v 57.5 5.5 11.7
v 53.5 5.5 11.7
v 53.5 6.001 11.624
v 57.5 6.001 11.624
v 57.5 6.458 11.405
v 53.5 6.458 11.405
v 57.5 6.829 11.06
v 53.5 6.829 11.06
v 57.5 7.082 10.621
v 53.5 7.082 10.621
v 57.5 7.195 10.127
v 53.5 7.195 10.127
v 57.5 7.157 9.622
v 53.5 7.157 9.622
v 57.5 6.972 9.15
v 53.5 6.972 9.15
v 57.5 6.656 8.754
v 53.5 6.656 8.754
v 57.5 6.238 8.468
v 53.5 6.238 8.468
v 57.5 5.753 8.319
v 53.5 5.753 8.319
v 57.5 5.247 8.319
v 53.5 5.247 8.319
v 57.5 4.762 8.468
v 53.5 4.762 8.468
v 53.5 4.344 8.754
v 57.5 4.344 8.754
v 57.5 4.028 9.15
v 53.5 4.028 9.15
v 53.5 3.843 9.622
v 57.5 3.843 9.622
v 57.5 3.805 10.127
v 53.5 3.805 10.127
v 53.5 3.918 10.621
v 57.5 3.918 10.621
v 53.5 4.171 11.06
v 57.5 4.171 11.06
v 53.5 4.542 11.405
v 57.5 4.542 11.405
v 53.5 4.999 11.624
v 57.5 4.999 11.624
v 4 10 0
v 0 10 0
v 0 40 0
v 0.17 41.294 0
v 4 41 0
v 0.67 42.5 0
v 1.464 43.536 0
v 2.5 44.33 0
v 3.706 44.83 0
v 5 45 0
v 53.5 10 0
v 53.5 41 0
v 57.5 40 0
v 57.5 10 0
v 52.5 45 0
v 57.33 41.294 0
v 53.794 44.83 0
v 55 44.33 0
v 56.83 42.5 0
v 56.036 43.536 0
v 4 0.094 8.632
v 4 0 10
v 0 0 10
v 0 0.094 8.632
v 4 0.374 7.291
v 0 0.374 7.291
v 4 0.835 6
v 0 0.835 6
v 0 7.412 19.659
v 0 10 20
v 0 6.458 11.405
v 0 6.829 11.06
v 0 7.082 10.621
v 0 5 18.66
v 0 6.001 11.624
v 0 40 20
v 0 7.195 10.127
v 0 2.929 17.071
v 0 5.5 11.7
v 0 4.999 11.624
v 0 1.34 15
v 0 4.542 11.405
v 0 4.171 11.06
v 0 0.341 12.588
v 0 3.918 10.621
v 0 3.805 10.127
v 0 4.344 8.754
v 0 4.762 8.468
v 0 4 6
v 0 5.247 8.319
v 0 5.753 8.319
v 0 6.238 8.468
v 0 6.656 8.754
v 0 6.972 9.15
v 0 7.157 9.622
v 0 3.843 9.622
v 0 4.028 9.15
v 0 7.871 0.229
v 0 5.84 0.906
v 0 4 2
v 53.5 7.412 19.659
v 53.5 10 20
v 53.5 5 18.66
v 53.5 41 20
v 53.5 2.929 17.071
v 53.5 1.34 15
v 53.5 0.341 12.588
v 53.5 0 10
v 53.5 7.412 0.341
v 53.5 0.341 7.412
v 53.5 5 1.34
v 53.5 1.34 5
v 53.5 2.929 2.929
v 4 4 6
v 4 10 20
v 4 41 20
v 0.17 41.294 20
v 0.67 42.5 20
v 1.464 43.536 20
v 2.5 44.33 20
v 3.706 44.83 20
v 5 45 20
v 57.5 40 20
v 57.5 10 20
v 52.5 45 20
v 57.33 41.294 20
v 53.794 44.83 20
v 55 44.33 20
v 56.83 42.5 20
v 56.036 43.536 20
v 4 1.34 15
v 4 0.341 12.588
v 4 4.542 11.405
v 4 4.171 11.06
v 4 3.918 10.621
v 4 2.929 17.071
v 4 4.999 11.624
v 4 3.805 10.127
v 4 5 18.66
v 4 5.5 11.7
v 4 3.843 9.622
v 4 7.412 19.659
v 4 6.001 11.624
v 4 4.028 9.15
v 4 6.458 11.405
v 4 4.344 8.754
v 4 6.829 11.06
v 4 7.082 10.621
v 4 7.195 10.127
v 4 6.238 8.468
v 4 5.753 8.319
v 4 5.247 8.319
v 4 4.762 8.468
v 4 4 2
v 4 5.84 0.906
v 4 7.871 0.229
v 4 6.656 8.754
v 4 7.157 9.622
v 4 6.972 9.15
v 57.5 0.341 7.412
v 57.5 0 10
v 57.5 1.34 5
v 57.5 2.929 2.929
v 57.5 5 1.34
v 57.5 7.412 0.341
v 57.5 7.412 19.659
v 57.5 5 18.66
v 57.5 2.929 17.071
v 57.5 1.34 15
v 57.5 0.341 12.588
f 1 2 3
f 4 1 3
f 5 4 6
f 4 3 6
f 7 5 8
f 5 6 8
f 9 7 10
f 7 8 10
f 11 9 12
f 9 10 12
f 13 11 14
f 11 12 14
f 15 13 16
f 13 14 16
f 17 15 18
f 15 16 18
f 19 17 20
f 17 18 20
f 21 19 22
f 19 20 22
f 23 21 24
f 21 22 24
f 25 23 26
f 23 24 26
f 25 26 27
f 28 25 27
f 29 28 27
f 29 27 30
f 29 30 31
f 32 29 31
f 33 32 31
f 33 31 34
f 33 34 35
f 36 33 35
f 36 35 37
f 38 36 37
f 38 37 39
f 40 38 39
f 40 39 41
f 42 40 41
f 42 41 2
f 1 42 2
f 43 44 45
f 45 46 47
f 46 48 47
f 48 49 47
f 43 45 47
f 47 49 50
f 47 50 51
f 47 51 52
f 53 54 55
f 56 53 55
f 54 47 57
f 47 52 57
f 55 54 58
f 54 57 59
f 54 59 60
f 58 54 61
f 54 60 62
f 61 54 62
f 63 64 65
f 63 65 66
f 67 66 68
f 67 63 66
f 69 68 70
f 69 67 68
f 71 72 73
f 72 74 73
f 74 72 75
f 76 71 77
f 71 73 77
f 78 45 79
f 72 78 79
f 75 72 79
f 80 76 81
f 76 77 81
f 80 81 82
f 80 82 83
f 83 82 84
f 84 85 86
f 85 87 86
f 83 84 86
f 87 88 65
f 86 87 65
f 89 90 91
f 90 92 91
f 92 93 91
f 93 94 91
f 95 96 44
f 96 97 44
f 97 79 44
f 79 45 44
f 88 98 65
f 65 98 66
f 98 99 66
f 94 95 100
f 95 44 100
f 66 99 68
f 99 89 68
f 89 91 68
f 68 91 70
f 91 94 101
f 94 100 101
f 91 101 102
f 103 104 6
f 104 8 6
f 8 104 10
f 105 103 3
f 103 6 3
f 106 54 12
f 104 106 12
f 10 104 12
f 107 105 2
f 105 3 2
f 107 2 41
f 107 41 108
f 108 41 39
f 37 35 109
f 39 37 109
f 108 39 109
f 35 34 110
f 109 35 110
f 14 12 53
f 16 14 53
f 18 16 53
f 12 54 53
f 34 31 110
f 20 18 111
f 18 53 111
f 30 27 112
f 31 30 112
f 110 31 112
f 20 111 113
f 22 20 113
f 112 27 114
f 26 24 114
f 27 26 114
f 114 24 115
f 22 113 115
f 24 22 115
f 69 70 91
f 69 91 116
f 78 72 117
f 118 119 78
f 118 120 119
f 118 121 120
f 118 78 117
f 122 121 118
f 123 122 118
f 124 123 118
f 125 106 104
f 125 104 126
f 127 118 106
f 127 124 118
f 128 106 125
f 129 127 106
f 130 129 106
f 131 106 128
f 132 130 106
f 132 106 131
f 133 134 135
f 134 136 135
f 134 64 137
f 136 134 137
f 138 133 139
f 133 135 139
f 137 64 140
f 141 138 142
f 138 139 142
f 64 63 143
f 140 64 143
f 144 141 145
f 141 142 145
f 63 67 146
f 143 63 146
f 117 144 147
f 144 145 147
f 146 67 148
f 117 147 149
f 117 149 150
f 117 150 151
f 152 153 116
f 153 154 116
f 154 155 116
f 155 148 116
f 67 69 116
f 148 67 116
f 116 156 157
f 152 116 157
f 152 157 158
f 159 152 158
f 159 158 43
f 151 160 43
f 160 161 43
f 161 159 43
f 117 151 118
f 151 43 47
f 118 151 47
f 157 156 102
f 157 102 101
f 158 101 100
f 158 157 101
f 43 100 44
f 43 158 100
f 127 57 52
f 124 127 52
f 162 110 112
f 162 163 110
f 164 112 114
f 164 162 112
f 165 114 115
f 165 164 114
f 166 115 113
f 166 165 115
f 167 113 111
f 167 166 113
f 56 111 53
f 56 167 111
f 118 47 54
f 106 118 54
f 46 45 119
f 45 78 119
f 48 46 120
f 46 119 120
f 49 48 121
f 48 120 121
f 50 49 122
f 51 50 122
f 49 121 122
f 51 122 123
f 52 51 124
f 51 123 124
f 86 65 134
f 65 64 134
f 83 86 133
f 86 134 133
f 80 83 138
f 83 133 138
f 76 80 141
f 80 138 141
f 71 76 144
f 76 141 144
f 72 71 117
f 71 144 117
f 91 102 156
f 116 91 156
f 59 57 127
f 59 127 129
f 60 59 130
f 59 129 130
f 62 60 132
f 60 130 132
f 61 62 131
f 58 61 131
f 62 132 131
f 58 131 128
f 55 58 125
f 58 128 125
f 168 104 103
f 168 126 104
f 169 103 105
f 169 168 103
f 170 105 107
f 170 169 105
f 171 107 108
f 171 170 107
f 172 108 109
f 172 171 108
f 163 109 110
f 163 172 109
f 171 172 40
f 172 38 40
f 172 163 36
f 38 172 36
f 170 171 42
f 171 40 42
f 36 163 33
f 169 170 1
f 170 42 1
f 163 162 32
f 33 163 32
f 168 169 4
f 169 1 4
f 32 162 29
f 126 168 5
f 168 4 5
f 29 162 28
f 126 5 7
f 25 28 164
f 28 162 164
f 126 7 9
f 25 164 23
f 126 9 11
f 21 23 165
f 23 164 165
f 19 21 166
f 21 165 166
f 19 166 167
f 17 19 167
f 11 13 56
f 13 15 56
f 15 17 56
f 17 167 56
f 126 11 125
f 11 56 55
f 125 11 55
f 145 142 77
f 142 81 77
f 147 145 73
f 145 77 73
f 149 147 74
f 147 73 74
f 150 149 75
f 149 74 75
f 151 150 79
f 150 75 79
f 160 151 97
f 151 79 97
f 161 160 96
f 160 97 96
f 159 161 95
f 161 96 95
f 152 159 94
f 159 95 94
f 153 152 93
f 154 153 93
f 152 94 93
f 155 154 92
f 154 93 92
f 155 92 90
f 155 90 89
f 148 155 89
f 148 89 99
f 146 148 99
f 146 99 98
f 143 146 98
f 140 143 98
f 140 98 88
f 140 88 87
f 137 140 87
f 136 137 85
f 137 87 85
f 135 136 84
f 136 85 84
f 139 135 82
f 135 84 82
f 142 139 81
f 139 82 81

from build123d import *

# Parameters (mm, degrees)
BOSS_EXTRU_1_DEPTH          = 20
ENL_V_MAT_EXTRU_1_REACH     = 77.705
ESQUISSE2_R                 = 1.5
D_GAGEMENT_M31_D            = 3.4
D_GAGEMENT_M31_DEPTH        = 57.5
D_GAGEMENT_M31_TIP          = 1.021463052
CONG_1_R                    = 10
CONG_2_R                    = 5
ENL_V_START                 = 0.83484861
ENL_V_MAT_EXTRU_2_OUTLINE_W = 4
ENL_V_MAT_EXTRU_2_OUTLINE_H = 5
ENL_V_MAT_EXTRU_2_DEPTH     = 3.16515139


# Read off the part's stored shape, not the designer's step: Enlèv. mat.-Extru.2
with BuildPart() as part:
    # Esquisse1 → Boss.-Extru.1 (new body)
    with BuildSketch(Plane.XY):
        Polygon((0, 0), (4, 0), (4, 41), (53.5, 41), (53.5, 0), (57.5, 0), (57.5, 45), (0, 45), align=None)
    extrude(amount=BOSS_EXTRU_1_DEPTH)

    # Enlèv. mat.-Extru.1: up to this face of the body (flat: up to its plane)
    enl_v_mat_extru_1_end = Plane(part.part.faces().sort_by_distance((0, 22.5, 10))[0])
    # Esquisse2 → Enlèv. mat.-Extru.1 (cut, up to the picked face)
    with BuildSketch(Plane(origin=(57.5, 0, 0), x_dir=(0, 0, -1), z_dir=(1, 0, 0)), mode=Mode.PRIVATE) as enl_v_mat_extru_1_sk1:
        with Locations((-10, 5.5)):
            Circle(ESQUISSE2_R)
    enl_v_mat_extru_1_tool1 = split(extrude(enl_v_mat_extru_1_sk1.sketch, amount=-ENL_V_MAT_EXTRU_1_REACH, mode=Mode.PRIVATE), bisect_by=enl_v_mat_extru_1_end, keep=Keep.BOTH, mode=Mode.PRIVATE)
    add(enl_v_mat_extru_1_tool1.solids().sort_by(Axis((57.5, 5.5, 10), (-1, 0, 0)))[0], mode=Mode.SUBTRACT)

    # Dégagement M31
    with Locations(Plane(origin=(57.5, 0, 0), x_dir=(0, 0, -1), z_dir=(1, 0, 0))):
        with Locations((-10, 5.5)):
            Hole(D_GAGEMENT_M31_D / 2, depth=D_GAGEMENT_M31_DEPTH)
            with Locations((0, 0, -(D_GAGEMENT_M31_DEPTH + D_GAGEMENT_M31_TIP / 2))):  # 118° drill point
                Cone(0, D_GAGEMENT_M31_D / 2, D_GAGEMENT_M31_TIP, mode=Mode.SUBTRACT)

    # Congé1
    cong_1_edges = [part.edges().sort_by_distance(p)[0] for p in [
        (55.5, 0, 0),
        (55.5, 0, 20),
        (2, 0, 0),
        (2, 0, 20),
    ]]
    fillet(cong_1_edges, radius=CONG_1_R - 0.0001)  # a hair under: the kernel refuses the full size

    # Congé2
    cong_2_edges = [part.edges().sort_by_distance(p)[0] for p in [
        (0, 45, 10),
        (57.5, 45, 10),
    ]]
    fillet(cong_2_edges, radius=CONG_2_R)

    # Enlèv. mat.-Extru.2 outline → Enlèv. mat.-Extru.2 (cut)
    with BuildSketch(Plane(origin=(0, 0, 0), x_dir=(1, 0, 0), z_dir=(0, 1, 0)).offset(ENL_V_START)):
        with Locations((2, -3.5)):
            Rectangle(ENL_V_MAT_EXTRU_2_OUTLINE_W, ENL_V_MAT_EXTRU_2_OUTLINE_H)
    extrude(amount=ENL_V_MAT_EXTRU_2_DEPTH, mode=Mode.SUBTRACT)


solid = part.part
